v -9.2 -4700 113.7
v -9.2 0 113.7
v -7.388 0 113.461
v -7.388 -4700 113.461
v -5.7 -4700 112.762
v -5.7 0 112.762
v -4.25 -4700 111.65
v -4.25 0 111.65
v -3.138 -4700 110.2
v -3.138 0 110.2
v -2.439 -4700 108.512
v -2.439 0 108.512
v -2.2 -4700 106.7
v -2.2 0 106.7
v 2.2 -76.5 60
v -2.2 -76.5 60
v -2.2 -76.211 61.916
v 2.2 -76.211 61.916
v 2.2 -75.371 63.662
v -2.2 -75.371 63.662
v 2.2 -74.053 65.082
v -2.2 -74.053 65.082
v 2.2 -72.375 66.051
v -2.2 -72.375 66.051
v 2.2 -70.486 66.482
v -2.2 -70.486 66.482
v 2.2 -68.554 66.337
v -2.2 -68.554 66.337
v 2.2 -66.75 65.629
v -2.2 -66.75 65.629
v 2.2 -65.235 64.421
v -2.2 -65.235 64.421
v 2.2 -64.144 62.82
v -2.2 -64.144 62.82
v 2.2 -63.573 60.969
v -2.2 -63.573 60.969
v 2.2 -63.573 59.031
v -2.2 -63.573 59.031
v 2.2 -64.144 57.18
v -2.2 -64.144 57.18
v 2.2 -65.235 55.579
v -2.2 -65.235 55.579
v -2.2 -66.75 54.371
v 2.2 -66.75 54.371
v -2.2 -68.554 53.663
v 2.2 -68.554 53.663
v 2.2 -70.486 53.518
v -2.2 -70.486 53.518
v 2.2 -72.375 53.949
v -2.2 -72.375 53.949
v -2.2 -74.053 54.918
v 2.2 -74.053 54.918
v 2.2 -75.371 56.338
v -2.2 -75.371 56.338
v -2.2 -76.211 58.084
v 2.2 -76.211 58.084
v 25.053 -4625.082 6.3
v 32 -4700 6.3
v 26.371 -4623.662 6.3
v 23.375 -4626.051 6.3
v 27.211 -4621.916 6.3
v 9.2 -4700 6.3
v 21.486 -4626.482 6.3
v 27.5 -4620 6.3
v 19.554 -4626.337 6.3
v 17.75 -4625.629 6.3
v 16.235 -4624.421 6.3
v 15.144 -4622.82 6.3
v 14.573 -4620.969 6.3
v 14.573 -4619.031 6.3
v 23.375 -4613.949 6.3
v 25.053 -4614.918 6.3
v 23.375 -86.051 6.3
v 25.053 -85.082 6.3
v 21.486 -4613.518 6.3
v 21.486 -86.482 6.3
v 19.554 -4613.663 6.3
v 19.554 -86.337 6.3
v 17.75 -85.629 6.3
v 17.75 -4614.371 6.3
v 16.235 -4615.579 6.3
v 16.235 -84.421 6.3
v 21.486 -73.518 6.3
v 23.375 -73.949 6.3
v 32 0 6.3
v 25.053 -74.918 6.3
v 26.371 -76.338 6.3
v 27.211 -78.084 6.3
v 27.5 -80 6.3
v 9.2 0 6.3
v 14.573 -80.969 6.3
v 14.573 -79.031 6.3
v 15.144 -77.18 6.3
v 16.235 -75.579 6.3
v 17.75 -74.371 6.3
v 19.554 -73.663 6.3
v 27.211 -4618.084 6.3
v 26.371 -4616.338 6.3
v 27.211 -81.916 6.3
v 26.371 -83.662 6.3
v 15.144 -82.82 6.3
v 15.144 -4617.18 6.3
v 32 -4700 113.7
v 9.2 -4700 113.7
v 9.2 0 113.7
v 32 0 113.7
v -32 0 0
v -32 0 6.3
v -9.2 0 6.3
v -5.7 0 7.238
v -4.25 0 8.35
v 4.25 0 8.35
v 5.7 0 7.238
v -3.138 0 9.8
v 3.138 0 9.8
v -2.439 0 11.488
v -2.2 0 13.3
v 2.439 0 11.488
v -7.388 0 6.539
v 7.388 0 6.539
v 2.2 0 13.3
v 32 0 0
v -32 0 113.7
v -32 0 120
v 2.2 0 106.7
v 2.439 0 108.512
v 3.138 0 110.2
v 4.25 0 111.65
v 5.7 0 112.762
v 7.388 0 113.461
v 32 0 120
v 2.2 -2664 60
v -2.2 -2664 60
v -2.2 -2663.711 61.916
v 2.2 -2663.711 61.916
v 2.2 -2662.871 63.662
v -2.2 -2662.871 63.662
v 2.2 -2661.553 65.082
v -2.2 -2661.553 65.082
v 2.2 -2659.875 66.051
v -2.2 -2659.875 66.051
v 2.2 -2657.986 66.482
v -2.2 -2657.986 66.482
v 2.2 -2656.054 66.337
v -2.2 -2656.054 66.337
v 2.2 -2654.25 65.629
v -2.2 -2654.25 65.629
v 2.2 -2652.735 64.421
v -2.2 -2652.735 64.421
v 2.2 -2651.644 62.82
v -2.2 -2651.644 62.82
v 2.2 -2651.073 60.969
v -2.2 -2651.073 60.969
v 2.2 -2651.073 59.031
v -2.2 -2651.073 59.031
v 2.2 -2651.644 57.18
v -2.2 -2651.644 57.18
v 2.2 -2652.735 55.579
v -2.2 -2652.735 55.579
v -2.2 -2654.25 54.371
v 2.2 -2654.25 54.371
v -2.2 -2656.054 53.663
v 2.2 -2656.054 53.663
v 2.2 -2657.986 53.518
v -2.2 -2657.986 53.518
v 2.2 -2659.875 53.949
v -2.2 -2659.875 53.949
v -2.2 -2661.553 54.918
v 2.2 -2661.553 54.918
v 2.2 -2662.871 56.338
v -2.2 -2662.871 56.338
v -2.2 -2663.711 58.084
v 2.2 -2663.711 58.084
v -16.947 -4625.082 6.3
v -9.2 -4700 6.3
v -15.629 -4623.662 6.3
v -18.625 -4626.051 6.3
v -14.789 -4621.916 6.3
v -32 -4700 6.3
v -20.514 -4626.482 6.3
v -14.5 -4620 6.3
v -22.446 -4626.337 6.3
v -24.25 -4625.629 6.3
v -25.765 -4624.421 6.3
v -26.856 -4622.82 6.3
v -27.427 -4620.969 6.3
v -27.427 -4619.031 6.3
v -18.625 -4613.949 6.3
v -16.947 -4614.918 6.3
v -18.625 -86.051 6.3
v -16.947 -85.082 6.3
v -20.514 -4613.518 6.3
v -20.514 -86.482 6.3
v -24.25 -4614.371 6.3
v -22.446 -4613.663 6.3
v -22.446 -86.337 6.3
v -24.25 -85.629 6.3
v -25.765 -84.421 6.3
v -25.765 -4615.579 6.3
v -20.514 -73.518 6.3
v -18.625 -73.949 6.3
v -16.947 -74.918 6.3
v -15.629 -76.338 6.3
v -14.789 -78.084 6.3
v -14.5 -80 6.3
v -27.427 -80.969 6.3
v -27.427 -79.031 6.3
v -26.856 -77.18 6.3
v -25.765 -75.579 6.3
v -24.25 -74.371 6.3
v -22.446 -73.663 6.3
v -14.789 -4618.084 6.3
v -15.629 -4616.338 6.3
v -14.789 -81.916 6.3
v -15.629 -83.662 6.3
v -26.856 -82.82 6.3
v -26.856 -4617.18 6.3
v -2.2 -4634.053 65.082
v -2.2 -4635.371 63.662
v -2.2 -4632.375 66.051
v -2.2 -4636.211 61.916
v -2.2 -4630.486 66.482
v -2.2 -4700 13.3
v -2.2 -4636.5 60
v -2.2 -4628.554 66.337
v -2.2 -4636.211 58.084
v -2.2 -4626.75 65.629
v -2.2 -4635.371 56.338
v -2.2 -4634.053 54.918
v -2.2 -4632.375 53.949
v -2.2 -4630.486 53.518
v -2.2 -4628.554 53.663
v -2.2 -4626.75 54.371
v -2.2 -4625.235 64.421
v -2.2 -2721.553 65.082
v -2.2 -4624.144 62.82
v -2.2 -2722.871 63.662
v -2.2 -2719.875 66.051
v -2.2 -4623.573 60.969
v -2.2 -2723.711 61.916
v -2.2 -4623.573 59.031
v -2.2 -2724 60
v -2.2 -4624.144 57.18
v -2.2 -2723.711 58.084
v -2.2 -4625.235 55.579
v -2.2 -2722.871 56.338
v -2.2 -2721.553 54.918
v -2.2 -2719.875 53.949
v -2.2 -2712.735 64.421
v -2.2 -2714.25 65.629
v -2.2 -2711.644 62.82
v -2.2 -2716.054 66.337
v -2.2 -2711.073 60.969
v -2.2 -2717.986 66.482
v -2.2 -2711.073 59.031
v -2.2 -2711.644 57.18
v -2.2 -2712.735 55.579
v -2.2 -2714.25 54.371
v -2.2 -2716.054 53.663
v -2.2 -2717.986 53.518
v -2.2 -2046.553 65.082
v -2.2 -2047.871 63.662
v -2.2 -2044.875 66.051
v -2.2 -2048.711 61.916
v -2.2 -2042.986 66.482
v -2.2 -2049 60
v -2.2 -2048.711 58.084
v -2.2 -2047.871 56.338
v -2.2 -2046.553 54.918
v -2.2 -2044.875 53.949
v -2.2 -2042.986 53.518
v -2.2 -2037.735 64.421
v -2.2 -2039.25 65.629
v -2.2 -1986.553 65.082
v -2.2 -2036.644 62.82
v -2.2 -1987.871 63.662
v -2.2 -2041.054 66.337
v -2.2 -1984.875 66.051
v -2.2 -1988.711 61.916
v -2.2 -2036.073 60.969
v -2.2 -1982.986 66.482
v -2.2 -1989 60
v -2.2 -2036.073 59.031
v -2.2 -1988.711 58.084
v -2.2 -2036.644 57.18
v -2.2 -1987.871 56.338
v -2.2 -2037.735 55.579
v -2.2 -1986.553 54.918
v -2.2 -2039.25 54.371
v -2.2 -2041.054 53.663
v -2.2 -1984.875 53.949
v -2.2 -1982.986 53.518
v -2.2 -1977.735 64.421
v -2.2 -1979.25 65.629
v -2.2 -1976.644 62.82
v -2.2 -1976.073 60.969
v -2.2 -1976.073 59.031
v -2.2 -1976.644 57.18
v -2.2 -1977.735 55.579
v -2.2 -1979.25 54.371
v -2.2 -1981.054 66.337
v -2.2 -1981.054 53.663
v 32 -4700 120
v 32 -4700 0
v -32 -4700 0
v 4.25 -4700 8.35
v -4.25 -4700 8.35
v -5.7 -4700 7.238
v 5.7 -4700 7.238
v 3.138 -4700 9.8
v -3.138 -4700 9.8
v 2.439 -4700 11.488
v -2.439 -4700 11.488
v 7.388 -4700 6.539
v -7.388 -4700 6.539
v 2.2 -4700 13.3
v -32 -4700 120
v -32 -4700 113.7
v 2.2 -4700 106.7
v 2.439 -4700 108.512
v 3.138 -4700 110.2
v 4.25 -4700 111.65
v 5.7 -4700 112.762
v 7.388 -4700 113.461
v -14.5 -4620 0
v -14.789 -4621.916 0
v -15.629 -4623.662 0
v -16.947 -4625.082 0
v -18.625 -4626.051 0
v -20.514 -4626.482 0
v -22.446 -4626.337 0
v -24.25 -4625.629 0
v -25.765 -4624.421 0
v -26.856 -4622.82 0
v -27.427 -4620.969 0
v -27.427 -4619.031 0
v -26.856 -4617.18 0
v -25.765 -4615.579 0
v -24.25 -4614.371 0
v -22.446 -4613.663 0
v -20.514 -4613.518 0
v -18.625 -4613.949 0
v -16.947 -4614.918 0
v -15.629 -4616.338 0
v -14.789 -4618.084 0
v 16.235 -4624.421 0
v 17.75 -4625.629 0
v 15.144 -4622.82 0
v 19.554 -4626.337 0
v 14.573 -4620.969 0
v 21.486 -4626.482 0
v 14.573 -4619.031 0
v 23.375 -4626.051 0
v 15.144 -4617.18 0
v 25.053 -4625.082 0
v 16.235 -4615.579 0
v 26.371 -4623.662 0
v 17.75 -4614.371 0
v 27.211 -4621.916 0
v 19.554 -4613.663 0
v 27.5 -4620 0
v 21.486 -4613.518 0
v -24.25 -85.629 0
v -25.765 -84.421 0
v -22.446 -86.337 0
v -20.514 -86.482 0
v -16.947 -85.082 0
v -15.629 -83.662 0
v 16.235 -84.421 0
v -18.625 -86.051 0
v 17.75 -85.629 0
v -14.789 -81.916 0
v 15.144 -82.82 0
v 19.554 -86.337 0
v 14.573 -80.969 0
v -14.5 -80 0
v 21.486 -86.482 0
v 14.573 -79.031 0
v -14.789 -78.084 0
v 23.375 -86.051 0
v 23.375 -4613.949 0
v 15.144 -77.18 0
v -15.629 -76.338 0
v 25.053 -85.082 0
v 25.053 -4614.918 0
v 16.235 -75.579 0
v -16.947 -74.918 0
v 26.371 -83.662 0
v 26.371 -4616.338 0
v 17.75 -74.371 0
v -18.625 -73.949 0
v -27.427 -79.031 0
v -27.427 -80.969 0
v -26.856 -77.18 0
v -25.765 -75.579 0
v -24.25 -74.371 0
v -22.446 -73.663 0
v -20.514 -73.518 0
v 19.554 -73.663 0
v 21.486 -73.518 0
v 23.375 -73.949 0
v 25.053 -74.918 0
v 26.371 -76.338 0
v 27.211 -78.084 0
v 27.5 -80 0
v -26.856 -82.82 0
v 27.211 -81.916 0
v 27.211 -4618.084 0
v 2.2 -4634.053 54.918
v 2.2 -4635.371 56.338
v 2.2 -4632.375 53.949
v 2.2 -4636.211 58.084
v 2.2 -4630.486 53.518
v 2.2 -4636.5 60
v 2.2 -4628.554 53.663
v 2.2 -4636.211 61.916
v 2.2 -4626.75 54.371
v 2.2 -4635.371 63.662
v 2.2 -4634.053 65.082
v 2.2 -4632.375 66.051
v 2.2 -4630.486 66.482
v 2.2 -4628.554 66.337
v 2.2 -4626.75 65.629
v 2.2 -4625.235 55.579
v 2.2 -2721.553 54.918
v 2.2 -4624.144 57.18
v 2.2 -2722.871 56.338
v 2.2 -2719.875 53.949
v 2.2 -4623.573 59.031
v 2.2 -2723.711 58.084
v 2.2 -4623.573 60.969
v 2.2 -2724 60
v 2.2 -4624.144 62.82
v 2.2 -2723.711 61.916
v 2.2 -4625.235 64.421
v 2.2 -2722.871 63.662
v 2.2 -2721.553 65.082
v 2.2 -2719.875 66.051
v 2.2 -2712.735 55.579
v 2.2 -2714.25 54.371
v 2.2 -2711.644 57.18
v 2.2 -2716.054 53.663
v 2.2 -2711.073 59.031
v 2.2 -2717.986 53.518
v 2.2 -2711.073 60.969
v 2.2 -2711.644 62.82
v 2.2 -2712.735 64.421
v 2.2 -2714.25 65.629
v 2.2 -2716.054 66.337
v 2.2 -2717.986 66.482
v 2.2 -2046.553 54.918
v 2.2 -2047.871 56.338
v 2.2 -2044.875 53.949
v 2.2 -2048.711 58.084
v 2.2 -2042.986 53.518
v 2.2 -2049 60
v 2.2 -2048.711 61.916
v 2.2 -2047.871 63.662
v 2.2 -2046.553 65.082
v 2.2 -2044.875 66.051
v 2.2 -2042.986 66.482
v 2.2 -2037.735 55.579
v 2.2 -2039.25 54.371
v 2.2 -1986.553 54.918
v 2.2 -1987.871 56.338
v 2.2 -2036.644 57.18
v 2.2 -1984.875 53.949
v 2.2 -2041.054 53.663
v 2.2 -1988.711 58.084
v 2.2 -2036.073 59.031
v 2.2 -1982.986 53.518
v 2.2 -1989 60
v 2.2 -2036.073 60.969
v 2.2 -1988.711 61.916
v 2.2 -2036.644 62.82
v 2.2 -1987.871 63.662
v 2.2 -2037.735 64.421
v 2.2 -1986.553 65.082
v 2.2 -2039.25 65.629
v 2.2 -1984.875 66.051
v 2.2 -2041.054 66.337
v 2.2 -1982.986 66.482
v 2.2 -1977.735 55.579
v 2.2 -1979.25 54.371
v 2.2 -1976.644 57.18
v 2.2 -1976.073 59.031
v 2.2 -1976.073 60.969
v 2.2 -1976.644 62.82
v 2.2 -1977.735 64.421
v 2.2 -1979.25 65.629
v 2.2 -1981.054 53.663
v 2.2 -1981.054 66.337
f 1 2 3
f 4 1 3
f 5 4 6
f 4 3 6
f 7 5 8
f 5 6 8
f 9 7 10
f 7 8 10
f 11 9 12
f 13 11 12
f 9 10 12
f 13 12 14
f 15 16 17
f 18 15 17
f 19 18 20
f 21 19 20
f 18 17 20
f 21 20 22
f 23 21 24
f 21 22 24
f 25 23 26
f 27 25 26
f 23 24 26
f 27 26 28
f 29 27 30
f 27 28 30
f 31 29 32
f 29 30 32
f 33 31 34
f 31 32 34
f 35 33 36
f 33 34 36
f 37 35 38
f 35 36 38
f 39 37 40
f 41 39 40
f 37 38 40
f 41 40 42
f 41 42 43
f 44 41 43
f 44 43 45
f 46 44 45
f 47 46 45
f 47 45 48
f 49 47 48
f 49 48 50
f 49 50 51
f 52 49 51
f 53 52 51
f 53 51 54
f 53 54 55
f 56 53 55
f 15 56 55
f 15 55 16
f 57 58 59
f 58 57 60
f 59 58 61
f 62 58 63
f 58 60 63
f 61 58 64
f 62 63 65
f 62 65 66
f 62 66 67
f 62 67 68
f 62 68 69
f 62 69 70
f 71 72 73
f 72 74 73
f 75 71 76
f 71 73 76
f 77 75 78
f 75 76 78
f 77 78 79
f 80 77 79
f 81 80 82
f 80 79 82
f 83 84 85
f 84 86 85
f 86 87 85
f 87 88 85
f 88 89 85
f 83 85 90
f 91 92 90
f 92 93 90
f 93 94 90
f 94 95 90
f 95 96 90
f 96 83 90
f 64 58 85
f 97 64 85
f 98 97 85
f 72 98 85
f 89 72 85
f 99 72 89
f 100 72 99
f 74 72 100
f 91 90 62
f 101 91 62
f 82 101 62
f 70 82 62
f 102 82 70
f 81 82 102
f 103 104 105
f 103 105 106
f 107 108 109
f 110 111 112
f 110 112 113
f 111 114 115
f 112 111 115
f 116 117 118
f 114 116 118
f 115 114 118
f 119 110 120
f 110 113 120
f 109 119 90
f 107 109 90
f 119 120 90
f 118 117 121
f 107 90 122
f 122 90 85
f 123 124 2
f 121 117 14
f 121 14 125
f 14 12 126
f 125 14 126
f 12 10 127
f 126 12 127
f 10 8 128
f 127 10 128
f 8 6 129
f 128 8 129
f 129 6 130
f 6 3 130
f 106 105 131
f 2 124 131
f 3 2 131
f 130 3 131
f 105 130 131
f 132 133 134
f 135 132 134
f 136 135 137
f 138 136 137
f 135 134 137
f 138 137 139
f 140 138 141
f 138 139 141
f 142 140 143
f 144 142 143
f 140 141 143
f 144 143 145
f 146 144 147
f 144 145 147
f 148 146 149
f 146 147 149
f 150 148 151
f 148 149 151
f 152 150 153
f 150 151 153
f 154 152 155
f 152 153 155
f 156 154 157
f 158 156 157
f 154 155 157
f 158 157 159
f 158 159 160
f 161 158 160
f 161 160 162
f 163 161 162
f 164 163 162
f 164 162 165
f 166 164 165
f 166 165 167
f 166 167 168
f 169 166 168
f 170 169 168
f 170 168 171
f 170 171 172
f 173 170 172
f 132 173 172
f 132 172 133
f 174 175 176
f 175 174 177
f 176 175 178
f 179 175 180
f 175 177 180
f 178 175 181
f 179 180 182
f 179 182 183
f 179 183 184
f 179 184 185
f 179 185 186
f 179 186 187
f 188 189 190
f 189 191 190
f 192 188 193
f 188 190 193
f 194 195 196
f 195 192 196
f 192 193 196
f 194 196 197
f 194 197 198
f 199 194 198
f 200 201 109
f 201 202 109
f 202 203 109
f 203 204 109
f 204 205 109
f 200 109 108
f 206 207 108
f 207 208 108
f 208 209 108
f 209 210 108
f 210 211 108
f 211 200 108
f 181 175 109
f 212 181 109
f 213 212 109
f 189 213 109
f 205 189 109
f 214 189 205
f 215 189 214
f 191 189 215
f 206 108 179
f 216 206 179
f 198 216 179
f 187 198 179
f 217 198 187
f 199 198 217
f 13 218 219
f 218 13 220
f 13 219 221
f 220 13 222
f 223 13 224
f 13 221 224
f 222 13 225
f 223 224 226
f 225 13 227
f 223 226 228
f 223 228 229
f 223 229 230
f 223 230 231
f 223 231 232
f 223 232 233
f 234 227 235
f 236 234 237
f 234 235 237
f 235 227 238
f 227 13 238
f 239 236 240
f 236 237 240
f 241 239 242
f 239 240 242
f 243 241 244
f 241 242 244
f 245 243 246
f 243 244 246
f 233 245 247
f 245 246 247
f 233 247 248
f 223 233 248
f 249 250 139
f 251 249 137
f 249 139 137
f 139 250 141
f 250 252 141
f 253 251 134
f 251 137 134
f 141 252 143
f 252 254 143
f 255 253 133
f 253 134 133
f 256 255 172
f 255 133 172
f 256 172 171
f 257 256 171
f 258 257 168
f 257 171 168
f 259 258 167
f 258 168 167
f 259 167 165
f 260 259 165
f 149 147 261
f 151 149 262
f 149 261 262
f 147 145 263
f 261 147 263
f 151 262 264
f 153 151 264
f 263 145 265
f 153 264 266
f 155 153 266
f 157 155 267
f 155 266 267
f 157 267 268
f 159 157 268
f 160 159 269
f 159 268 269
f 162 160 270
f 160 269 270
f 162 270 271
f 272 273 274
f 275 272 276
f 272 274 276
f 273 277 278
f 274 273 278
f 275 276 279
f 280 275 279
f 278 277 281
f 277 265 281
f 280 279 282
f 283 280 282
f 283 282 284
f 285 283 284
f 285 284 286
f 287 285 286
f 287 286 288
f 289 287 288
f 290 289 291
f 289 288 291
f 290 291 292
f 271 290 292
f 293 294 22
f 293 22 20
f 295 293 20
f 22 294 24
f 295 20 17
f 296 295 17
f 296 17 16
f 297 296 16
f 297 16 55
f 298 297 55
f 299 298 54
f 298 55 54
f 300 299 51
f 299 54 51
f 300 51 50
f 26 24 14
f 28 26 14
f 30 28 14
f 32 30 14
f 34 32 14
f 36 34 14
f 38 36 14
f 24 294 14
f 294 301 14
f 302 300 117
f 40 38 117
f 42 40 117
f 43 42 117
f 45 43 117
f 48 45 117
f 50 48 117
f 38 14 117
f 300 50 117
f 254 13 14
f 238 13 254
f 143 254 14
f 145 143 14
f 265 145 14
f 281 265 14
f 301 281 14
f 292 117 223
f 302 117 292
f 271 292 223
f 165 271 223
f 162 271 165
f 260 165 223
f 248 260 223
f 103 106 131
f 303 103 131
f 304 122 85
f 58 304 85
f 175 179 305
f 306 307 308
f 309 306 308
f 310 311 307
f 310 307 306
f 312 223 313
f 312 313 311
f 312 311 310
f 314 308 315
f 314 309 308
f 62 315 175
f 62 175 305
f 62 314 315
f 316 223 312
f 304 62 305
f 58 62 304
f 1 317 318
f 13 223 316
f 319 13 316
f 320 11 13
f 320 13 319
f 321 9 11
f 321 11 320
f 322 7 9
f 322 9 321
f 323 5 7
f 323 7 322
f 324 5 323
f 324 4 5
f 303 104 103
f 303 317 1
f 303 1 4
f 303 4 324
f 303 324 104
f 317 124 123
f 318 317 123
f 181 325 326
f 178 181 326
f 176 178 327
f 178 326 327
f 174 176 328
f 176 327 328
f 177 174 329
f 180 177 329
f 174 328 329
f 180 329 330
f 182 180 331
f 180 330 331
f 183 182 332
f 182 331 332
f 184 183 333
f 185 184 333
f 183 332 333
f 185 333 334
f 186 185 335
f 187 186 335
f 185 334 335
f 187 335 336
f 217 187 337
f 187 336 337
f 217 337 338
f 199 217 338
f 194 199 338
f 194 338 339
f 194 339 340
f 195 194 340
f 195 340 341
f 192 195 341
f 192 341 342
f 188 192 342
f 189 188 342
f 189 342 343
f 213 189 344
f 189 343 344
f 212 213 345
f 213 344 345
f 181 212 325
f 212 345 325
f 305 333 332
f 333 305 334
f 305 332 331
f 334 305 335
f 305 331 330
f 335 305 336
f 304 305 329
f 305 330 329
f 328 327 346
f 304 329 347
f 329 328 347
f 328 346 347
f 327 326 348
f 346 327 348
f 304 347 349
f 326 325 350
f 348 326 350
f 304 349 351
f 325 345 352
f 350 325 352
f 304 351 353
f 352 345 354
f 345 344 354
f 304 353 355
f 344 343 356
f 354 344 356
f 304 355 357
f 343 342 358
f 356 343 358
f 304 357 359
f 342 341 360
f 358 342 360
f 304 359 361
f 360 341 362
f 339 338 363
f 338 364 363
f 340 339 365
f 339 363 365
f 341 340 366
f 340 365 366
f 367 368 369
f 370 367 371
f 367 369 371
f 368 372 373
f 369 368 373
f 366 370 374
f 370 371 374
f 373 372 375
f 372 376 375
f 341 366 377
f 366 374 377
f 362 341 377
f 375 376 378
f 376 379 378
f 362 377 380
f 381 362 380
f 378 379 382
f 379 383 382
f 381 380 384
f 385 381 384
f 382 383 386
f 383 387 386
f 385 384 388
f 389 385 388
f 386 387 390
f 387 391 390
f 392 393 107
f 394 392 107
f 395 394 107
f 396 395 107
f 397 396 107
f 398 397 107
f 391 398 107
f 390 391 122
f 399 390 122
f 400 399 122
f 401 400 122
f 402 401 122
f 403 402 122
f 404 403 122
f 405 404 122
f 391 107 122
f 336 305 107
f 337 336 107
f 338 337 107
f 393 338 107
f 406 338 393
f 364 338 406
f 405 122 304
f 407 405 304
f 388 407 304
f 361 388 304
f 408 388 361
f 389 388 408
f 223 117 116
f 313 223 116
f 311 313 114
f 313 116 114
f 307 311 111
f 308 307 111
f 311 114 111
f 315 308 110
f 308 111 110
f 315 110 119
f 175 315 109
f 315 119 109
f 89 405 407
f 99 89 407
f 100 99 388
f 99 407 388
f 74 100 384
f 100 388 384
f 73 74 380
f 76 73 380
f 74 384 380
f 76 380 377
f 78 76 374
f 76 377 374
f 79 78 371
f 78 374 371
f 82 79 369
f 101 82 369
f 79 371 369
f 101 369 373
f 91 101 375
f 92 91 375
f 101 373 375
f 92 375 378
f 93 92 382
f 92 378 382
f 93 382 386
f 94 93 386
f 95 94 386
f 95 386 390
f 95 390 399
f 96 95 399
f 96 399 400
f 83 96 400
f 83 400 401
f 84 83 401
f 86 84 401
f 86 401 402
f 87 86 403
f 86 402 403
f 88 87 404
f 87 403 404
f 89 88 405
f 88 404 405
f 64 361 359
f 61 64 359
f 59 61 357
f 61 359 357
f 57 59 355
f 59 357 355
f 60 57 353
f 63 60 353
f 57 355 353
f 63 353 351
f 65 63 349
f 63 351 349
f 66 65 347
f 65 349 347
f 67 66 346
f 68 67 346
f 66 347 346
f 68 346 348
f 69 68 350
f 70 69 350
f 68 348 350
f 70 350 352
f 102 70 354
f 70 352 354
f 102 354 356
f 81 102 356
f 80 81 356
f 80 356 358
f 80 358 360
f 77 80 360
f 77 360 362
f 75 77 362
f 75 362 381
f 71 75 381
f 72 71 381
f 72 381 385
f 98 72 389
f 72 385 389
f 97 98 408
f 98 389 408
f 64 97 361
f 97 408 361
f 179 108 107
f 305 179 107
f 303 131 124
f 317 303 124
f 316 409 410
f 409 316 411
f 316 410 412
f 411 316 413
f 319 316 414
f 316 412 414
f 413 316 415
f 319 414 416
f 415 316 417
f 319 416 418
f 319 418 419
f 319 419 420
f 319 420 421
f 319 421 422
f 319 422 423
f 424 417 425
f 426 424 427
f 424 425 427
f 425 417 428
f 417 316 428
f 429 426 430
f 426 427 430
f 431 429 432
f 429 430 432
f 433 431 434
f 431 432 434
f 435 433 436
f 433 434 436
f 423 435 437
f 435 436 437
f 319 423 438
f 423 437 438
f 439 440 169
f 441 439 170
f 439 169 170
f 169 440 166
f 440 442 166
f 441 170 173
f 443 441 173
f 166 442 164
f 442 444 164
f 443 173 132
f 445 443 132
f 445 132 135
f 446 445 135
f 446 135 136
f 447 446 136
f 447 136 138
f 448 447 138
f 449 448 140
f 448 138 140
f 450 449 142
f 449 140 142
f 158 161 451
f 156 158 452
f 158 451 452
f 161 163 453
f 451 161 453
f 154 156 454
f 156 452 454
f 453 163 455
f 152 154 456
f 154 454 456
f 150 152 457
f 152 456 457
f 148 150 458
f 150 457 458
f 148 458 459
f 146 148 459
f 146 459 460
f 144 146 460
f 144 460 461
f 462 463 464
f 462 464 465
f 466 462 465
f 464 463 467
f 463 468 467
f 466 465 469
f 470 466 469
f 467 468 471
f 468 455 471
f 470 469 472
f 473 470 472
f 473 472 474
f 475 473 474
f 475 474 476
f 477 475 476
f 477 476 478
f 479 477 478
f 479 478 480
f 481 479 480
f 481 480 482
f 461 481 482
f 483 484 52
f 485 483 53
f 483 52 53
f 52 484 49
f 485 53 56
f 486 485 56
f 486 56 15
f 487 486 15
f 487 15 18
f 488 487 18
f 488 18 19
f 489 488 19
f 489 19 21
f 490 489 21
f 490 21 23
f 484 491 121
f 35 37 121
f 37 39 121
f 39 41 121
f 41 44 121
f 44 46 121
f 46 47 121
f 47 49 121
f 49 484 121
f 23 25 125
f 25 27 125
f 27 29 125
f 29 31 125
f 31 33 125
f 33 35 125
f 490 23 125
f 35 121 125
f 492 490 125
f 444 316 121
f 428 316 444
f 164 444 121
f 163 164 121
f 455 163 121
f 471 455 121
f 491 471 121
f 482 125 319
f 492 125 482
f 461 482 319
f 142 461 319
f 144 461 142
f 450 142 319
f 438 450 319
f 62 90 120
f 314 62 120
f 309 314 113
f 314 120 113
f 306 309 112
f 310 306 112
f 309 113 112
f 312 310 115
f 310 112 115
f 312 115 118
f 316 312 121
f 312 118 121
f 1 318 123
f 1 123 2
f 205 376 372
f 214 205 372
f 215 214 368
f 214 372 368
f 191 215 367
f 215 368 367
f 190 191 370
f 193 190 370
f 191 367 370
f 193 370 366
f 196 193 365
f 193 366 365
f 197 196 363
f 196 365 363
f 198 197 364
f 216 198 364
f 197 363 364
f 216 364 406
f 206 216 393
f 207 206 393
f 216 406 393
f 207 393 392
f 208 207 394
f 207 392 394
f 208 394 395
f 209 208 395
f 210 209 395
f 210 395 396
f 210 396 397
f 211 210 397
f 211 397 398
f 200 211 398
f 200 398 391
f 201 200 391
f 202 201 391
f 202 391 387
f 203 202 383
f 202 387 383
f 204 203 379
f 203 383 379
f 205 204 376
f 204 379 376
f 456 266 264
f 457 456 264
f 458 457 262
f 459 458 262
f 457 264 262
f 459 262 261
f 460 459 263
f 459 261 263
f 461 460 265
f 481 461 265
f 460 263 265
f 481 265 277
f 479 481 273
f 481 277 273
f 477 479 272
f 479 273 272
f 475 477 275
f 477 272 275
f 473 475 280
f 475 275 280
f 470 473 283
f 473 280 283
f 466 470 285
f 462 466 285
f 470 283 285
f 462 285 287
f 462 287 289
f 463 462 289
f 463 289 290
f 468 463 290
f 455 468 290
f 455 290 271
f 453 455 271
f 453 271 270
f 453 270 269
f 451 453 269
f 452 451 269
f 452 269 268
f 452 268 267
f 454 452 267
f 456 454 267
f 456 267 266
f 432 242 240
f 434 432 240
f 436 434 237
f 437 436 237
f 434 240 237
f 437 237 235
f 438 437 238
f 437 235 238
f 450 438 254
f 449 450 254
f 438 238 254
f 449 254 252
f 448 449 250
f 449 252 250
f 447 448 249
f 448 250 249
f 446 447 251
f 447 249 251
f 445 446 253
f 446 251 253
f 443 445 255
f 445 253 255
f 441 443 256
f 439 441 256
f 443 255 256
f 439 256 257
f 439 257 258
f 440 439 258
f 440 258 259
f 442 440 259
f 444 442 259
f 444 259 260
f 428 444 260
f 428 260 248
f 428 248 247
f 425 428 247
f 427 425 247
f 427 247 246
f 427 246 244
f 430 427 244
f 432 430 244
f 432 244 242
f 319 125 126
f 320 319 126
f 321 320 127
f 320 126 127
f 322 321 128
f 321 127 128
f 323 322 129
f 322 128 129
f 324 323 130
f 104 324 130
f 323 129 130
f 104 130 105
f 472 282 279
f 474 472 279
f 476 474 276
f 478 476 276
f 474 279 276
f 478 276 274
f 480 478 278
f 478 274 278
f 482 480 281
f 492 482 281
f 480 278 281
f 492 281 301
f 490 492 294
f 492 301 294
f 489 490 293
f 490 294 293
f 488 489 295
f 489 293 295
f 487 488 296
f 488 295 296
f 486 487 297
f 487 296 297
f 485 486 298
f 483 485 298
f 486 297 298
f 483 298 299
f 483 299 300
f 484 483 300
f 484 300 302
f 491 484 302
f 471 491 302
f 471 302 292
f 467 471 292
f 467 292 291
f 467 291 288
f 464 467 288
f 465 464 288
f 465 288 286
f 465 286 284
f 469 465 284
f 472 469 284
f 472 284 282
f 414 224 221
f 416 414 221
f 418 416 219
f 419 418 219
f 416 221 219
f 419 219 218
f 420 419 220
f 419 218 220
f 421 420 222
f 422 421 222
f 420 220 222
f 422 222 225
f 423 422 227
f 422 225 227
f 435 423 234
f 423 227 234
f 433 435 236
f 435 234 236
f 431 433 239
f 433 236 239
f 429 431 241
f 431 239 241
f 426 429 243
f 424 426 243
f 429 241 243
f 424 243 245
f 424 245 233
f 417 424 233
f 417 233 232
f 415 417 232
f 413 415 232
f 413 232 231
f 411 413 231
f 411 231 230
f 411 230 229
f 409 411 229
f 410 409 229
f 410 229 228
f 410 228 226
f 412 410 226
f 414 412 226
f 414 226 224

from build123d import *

# Parameters (mm, degrees)
F2_DEPTH = 4700
F3_R     = 6.5
F4_DEPTH = 6.3
F5_R     = 6.5
F6_DEPTH = 34.201


with BuildPart() as f2:
    # F0 (on Front) → F2 (new body)
    with BuildSketch(Plane.XZ):
        with BuildLine():
            Line((-32, 6.3), (-32, 0))
            Line((-32, 0), (32, 0))
            Line((32, 0), (32, 6.3))
            Line((32, 6.3), (9.2, 6.3))
            ThreePointArc((9.2, 6.3), (4.2502525317, 8.3502525317), (2.2, 13.3))
            Line((2.2, 13.3), (2.2, 106.7))
            ThreePointArc((2.2, 106.7), (4.2502525317, 111.6497474683), (9.2, 113.7))
            Line((9.2, 113.7), (32, 113.7))
            Line((32, 113.7), (32, 120))
            Line((32, 120), (-32, 120))
            Line((-32, 120), (-32, 113.7))
            Line((-32, 113.7), (-9.2, 113.7))
            ThreePointArc((-9.2, 113.7), (-4.2502525317, 111.6497474683), (-2.2, 106.7))
            Line((-2.2, 106.7), (-2.2, 13.3))
            ThreePointArc((-2.2, 13.3), (-4.2502525317, 8.3502525317), (-9.2, 6.3))
            Line((-9.2, 6.3), (-32, 6.3))
        make_face()
    extrude(amount=F2_DEPTH)

    # F3 (on face) → F4 (cut, through all)
    with BuildSketch(Plane(origin=(0, 0, 0), x_dir=(1, 0, 0), z_dir=(0, 0, -1))):
        with Locations((21, 80)):
            Circle(F3_R)
        with Locations((-21, 80)):
            Circle(F3_R)
        with Locations((21, 4620)):
            Circle(F3_R)
        with Locations((-21, 4620)):
            Circle(F3_R)
    extrude(amount=-F4_DEPTH, mode=Mode.SUBTRACT)

    # F5 (on face) → F6 (cut, through all)
    with BuildSketch(Plane(origin=(-2.2, 0, 0), x_dir=(0, -1, 0), z_dir=(-1, 0, 0))):
        with Locations((70, 60)):
            Circle(F5_R)
        with Locations((4630, 60)):
            Circle(F5_R)
        with Locations((1982.5, 60)):
            Circle(F5_R)
        with Locations((2042.5, 60)):
            Circle(F5_R)
        with Locations((2717.5, 60)):
            Circle(F5_R)
        with Locations((2657.5, 60)):
            Circle(F5_R)
    extrude(amount=-F6_DEPTH, mode=Mode.SUBTRACT)


solid = f2.part
